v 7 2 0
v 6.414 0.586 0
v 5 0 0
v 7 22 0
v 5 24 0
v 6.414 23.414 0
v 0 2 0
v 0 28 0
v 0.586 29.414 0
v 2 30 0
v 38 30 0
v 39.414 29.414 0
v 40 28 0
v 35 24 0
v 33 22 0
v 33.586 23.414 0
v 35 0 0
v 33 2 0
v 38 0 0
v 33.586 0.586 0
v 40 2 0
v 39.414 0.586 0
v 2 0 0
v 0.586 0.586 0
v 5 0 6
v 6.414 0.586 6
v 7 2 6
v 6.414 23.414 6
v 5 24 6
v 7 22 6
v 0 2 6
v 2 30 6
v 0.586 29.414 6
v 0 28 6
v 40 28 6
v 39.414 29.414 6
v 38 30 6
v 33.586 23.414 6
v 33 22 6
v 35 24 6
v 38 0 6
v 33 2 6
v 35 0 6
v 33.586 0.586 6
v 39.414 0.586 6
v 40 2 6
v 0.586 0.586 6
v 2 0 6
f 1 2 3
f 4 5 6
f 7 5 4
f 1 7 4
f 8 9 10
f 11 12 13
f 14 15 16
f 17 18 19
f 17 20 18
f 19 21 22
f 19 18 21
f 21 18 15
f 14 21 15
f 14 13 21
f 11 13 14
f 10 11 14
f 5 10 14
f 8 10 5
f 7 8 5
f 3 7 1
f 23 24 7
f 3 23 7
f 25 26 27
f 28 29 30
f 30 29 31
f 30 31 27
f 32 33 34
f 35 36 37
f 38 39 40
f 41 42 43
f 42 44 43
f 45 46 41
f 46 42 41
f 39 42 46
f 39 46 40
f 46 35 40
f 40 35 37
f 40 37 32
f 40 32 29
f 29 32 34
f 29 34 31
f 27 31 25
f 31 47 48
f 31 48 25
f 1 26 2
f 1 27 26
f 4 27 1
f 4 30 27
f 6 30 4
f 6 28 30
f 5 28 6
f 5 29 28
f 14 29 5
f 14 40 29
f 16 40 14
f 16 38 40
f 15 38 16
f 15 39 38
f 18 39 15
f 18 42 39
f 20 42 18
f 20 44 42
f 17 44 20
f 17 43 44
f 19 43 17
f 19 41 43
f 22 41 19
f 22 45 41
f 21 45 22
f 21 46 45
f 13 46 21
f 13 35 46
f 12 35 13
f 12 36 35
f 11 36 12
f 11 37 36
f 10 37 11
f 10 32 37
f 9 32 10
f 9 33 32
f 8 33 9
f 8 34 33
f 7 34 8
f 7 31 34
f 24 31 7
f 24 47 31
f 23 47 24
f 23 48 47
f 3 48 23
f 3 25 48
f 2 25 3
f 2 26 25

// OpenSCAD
$fn = 32;

// ----------------------------------------------------------------------
// Clip blank: staple clip, 6 mm thick
// ----------------------------------------------------------------------

// --- parameters (mm) ---
profile_height = 6;       // extrusion height
profile_points = 24;      // points of the closed outline

profile = [[0, 2], [0.586, 0.586], [2, 0], [5, 0], [6.414, 0.586], [7, 2], [7, 22], [6.414, 23.414], [5, 24], [35, 24], [33.586, 23.414], [33, 22], [33, 2], [33.586, 0.586], [35, 0], [38, 0], [39.414, 0.586], [40, 2], [40, 28], [39.414, 29.414], [38, 30], [2, 30], [0.586, 29.414], [0, 28]];  // single closed polygon, 24 points, counter clockwise

// --- the one profile operation ---
linear_extrude(height = profile_height) polygon(points = profile);
